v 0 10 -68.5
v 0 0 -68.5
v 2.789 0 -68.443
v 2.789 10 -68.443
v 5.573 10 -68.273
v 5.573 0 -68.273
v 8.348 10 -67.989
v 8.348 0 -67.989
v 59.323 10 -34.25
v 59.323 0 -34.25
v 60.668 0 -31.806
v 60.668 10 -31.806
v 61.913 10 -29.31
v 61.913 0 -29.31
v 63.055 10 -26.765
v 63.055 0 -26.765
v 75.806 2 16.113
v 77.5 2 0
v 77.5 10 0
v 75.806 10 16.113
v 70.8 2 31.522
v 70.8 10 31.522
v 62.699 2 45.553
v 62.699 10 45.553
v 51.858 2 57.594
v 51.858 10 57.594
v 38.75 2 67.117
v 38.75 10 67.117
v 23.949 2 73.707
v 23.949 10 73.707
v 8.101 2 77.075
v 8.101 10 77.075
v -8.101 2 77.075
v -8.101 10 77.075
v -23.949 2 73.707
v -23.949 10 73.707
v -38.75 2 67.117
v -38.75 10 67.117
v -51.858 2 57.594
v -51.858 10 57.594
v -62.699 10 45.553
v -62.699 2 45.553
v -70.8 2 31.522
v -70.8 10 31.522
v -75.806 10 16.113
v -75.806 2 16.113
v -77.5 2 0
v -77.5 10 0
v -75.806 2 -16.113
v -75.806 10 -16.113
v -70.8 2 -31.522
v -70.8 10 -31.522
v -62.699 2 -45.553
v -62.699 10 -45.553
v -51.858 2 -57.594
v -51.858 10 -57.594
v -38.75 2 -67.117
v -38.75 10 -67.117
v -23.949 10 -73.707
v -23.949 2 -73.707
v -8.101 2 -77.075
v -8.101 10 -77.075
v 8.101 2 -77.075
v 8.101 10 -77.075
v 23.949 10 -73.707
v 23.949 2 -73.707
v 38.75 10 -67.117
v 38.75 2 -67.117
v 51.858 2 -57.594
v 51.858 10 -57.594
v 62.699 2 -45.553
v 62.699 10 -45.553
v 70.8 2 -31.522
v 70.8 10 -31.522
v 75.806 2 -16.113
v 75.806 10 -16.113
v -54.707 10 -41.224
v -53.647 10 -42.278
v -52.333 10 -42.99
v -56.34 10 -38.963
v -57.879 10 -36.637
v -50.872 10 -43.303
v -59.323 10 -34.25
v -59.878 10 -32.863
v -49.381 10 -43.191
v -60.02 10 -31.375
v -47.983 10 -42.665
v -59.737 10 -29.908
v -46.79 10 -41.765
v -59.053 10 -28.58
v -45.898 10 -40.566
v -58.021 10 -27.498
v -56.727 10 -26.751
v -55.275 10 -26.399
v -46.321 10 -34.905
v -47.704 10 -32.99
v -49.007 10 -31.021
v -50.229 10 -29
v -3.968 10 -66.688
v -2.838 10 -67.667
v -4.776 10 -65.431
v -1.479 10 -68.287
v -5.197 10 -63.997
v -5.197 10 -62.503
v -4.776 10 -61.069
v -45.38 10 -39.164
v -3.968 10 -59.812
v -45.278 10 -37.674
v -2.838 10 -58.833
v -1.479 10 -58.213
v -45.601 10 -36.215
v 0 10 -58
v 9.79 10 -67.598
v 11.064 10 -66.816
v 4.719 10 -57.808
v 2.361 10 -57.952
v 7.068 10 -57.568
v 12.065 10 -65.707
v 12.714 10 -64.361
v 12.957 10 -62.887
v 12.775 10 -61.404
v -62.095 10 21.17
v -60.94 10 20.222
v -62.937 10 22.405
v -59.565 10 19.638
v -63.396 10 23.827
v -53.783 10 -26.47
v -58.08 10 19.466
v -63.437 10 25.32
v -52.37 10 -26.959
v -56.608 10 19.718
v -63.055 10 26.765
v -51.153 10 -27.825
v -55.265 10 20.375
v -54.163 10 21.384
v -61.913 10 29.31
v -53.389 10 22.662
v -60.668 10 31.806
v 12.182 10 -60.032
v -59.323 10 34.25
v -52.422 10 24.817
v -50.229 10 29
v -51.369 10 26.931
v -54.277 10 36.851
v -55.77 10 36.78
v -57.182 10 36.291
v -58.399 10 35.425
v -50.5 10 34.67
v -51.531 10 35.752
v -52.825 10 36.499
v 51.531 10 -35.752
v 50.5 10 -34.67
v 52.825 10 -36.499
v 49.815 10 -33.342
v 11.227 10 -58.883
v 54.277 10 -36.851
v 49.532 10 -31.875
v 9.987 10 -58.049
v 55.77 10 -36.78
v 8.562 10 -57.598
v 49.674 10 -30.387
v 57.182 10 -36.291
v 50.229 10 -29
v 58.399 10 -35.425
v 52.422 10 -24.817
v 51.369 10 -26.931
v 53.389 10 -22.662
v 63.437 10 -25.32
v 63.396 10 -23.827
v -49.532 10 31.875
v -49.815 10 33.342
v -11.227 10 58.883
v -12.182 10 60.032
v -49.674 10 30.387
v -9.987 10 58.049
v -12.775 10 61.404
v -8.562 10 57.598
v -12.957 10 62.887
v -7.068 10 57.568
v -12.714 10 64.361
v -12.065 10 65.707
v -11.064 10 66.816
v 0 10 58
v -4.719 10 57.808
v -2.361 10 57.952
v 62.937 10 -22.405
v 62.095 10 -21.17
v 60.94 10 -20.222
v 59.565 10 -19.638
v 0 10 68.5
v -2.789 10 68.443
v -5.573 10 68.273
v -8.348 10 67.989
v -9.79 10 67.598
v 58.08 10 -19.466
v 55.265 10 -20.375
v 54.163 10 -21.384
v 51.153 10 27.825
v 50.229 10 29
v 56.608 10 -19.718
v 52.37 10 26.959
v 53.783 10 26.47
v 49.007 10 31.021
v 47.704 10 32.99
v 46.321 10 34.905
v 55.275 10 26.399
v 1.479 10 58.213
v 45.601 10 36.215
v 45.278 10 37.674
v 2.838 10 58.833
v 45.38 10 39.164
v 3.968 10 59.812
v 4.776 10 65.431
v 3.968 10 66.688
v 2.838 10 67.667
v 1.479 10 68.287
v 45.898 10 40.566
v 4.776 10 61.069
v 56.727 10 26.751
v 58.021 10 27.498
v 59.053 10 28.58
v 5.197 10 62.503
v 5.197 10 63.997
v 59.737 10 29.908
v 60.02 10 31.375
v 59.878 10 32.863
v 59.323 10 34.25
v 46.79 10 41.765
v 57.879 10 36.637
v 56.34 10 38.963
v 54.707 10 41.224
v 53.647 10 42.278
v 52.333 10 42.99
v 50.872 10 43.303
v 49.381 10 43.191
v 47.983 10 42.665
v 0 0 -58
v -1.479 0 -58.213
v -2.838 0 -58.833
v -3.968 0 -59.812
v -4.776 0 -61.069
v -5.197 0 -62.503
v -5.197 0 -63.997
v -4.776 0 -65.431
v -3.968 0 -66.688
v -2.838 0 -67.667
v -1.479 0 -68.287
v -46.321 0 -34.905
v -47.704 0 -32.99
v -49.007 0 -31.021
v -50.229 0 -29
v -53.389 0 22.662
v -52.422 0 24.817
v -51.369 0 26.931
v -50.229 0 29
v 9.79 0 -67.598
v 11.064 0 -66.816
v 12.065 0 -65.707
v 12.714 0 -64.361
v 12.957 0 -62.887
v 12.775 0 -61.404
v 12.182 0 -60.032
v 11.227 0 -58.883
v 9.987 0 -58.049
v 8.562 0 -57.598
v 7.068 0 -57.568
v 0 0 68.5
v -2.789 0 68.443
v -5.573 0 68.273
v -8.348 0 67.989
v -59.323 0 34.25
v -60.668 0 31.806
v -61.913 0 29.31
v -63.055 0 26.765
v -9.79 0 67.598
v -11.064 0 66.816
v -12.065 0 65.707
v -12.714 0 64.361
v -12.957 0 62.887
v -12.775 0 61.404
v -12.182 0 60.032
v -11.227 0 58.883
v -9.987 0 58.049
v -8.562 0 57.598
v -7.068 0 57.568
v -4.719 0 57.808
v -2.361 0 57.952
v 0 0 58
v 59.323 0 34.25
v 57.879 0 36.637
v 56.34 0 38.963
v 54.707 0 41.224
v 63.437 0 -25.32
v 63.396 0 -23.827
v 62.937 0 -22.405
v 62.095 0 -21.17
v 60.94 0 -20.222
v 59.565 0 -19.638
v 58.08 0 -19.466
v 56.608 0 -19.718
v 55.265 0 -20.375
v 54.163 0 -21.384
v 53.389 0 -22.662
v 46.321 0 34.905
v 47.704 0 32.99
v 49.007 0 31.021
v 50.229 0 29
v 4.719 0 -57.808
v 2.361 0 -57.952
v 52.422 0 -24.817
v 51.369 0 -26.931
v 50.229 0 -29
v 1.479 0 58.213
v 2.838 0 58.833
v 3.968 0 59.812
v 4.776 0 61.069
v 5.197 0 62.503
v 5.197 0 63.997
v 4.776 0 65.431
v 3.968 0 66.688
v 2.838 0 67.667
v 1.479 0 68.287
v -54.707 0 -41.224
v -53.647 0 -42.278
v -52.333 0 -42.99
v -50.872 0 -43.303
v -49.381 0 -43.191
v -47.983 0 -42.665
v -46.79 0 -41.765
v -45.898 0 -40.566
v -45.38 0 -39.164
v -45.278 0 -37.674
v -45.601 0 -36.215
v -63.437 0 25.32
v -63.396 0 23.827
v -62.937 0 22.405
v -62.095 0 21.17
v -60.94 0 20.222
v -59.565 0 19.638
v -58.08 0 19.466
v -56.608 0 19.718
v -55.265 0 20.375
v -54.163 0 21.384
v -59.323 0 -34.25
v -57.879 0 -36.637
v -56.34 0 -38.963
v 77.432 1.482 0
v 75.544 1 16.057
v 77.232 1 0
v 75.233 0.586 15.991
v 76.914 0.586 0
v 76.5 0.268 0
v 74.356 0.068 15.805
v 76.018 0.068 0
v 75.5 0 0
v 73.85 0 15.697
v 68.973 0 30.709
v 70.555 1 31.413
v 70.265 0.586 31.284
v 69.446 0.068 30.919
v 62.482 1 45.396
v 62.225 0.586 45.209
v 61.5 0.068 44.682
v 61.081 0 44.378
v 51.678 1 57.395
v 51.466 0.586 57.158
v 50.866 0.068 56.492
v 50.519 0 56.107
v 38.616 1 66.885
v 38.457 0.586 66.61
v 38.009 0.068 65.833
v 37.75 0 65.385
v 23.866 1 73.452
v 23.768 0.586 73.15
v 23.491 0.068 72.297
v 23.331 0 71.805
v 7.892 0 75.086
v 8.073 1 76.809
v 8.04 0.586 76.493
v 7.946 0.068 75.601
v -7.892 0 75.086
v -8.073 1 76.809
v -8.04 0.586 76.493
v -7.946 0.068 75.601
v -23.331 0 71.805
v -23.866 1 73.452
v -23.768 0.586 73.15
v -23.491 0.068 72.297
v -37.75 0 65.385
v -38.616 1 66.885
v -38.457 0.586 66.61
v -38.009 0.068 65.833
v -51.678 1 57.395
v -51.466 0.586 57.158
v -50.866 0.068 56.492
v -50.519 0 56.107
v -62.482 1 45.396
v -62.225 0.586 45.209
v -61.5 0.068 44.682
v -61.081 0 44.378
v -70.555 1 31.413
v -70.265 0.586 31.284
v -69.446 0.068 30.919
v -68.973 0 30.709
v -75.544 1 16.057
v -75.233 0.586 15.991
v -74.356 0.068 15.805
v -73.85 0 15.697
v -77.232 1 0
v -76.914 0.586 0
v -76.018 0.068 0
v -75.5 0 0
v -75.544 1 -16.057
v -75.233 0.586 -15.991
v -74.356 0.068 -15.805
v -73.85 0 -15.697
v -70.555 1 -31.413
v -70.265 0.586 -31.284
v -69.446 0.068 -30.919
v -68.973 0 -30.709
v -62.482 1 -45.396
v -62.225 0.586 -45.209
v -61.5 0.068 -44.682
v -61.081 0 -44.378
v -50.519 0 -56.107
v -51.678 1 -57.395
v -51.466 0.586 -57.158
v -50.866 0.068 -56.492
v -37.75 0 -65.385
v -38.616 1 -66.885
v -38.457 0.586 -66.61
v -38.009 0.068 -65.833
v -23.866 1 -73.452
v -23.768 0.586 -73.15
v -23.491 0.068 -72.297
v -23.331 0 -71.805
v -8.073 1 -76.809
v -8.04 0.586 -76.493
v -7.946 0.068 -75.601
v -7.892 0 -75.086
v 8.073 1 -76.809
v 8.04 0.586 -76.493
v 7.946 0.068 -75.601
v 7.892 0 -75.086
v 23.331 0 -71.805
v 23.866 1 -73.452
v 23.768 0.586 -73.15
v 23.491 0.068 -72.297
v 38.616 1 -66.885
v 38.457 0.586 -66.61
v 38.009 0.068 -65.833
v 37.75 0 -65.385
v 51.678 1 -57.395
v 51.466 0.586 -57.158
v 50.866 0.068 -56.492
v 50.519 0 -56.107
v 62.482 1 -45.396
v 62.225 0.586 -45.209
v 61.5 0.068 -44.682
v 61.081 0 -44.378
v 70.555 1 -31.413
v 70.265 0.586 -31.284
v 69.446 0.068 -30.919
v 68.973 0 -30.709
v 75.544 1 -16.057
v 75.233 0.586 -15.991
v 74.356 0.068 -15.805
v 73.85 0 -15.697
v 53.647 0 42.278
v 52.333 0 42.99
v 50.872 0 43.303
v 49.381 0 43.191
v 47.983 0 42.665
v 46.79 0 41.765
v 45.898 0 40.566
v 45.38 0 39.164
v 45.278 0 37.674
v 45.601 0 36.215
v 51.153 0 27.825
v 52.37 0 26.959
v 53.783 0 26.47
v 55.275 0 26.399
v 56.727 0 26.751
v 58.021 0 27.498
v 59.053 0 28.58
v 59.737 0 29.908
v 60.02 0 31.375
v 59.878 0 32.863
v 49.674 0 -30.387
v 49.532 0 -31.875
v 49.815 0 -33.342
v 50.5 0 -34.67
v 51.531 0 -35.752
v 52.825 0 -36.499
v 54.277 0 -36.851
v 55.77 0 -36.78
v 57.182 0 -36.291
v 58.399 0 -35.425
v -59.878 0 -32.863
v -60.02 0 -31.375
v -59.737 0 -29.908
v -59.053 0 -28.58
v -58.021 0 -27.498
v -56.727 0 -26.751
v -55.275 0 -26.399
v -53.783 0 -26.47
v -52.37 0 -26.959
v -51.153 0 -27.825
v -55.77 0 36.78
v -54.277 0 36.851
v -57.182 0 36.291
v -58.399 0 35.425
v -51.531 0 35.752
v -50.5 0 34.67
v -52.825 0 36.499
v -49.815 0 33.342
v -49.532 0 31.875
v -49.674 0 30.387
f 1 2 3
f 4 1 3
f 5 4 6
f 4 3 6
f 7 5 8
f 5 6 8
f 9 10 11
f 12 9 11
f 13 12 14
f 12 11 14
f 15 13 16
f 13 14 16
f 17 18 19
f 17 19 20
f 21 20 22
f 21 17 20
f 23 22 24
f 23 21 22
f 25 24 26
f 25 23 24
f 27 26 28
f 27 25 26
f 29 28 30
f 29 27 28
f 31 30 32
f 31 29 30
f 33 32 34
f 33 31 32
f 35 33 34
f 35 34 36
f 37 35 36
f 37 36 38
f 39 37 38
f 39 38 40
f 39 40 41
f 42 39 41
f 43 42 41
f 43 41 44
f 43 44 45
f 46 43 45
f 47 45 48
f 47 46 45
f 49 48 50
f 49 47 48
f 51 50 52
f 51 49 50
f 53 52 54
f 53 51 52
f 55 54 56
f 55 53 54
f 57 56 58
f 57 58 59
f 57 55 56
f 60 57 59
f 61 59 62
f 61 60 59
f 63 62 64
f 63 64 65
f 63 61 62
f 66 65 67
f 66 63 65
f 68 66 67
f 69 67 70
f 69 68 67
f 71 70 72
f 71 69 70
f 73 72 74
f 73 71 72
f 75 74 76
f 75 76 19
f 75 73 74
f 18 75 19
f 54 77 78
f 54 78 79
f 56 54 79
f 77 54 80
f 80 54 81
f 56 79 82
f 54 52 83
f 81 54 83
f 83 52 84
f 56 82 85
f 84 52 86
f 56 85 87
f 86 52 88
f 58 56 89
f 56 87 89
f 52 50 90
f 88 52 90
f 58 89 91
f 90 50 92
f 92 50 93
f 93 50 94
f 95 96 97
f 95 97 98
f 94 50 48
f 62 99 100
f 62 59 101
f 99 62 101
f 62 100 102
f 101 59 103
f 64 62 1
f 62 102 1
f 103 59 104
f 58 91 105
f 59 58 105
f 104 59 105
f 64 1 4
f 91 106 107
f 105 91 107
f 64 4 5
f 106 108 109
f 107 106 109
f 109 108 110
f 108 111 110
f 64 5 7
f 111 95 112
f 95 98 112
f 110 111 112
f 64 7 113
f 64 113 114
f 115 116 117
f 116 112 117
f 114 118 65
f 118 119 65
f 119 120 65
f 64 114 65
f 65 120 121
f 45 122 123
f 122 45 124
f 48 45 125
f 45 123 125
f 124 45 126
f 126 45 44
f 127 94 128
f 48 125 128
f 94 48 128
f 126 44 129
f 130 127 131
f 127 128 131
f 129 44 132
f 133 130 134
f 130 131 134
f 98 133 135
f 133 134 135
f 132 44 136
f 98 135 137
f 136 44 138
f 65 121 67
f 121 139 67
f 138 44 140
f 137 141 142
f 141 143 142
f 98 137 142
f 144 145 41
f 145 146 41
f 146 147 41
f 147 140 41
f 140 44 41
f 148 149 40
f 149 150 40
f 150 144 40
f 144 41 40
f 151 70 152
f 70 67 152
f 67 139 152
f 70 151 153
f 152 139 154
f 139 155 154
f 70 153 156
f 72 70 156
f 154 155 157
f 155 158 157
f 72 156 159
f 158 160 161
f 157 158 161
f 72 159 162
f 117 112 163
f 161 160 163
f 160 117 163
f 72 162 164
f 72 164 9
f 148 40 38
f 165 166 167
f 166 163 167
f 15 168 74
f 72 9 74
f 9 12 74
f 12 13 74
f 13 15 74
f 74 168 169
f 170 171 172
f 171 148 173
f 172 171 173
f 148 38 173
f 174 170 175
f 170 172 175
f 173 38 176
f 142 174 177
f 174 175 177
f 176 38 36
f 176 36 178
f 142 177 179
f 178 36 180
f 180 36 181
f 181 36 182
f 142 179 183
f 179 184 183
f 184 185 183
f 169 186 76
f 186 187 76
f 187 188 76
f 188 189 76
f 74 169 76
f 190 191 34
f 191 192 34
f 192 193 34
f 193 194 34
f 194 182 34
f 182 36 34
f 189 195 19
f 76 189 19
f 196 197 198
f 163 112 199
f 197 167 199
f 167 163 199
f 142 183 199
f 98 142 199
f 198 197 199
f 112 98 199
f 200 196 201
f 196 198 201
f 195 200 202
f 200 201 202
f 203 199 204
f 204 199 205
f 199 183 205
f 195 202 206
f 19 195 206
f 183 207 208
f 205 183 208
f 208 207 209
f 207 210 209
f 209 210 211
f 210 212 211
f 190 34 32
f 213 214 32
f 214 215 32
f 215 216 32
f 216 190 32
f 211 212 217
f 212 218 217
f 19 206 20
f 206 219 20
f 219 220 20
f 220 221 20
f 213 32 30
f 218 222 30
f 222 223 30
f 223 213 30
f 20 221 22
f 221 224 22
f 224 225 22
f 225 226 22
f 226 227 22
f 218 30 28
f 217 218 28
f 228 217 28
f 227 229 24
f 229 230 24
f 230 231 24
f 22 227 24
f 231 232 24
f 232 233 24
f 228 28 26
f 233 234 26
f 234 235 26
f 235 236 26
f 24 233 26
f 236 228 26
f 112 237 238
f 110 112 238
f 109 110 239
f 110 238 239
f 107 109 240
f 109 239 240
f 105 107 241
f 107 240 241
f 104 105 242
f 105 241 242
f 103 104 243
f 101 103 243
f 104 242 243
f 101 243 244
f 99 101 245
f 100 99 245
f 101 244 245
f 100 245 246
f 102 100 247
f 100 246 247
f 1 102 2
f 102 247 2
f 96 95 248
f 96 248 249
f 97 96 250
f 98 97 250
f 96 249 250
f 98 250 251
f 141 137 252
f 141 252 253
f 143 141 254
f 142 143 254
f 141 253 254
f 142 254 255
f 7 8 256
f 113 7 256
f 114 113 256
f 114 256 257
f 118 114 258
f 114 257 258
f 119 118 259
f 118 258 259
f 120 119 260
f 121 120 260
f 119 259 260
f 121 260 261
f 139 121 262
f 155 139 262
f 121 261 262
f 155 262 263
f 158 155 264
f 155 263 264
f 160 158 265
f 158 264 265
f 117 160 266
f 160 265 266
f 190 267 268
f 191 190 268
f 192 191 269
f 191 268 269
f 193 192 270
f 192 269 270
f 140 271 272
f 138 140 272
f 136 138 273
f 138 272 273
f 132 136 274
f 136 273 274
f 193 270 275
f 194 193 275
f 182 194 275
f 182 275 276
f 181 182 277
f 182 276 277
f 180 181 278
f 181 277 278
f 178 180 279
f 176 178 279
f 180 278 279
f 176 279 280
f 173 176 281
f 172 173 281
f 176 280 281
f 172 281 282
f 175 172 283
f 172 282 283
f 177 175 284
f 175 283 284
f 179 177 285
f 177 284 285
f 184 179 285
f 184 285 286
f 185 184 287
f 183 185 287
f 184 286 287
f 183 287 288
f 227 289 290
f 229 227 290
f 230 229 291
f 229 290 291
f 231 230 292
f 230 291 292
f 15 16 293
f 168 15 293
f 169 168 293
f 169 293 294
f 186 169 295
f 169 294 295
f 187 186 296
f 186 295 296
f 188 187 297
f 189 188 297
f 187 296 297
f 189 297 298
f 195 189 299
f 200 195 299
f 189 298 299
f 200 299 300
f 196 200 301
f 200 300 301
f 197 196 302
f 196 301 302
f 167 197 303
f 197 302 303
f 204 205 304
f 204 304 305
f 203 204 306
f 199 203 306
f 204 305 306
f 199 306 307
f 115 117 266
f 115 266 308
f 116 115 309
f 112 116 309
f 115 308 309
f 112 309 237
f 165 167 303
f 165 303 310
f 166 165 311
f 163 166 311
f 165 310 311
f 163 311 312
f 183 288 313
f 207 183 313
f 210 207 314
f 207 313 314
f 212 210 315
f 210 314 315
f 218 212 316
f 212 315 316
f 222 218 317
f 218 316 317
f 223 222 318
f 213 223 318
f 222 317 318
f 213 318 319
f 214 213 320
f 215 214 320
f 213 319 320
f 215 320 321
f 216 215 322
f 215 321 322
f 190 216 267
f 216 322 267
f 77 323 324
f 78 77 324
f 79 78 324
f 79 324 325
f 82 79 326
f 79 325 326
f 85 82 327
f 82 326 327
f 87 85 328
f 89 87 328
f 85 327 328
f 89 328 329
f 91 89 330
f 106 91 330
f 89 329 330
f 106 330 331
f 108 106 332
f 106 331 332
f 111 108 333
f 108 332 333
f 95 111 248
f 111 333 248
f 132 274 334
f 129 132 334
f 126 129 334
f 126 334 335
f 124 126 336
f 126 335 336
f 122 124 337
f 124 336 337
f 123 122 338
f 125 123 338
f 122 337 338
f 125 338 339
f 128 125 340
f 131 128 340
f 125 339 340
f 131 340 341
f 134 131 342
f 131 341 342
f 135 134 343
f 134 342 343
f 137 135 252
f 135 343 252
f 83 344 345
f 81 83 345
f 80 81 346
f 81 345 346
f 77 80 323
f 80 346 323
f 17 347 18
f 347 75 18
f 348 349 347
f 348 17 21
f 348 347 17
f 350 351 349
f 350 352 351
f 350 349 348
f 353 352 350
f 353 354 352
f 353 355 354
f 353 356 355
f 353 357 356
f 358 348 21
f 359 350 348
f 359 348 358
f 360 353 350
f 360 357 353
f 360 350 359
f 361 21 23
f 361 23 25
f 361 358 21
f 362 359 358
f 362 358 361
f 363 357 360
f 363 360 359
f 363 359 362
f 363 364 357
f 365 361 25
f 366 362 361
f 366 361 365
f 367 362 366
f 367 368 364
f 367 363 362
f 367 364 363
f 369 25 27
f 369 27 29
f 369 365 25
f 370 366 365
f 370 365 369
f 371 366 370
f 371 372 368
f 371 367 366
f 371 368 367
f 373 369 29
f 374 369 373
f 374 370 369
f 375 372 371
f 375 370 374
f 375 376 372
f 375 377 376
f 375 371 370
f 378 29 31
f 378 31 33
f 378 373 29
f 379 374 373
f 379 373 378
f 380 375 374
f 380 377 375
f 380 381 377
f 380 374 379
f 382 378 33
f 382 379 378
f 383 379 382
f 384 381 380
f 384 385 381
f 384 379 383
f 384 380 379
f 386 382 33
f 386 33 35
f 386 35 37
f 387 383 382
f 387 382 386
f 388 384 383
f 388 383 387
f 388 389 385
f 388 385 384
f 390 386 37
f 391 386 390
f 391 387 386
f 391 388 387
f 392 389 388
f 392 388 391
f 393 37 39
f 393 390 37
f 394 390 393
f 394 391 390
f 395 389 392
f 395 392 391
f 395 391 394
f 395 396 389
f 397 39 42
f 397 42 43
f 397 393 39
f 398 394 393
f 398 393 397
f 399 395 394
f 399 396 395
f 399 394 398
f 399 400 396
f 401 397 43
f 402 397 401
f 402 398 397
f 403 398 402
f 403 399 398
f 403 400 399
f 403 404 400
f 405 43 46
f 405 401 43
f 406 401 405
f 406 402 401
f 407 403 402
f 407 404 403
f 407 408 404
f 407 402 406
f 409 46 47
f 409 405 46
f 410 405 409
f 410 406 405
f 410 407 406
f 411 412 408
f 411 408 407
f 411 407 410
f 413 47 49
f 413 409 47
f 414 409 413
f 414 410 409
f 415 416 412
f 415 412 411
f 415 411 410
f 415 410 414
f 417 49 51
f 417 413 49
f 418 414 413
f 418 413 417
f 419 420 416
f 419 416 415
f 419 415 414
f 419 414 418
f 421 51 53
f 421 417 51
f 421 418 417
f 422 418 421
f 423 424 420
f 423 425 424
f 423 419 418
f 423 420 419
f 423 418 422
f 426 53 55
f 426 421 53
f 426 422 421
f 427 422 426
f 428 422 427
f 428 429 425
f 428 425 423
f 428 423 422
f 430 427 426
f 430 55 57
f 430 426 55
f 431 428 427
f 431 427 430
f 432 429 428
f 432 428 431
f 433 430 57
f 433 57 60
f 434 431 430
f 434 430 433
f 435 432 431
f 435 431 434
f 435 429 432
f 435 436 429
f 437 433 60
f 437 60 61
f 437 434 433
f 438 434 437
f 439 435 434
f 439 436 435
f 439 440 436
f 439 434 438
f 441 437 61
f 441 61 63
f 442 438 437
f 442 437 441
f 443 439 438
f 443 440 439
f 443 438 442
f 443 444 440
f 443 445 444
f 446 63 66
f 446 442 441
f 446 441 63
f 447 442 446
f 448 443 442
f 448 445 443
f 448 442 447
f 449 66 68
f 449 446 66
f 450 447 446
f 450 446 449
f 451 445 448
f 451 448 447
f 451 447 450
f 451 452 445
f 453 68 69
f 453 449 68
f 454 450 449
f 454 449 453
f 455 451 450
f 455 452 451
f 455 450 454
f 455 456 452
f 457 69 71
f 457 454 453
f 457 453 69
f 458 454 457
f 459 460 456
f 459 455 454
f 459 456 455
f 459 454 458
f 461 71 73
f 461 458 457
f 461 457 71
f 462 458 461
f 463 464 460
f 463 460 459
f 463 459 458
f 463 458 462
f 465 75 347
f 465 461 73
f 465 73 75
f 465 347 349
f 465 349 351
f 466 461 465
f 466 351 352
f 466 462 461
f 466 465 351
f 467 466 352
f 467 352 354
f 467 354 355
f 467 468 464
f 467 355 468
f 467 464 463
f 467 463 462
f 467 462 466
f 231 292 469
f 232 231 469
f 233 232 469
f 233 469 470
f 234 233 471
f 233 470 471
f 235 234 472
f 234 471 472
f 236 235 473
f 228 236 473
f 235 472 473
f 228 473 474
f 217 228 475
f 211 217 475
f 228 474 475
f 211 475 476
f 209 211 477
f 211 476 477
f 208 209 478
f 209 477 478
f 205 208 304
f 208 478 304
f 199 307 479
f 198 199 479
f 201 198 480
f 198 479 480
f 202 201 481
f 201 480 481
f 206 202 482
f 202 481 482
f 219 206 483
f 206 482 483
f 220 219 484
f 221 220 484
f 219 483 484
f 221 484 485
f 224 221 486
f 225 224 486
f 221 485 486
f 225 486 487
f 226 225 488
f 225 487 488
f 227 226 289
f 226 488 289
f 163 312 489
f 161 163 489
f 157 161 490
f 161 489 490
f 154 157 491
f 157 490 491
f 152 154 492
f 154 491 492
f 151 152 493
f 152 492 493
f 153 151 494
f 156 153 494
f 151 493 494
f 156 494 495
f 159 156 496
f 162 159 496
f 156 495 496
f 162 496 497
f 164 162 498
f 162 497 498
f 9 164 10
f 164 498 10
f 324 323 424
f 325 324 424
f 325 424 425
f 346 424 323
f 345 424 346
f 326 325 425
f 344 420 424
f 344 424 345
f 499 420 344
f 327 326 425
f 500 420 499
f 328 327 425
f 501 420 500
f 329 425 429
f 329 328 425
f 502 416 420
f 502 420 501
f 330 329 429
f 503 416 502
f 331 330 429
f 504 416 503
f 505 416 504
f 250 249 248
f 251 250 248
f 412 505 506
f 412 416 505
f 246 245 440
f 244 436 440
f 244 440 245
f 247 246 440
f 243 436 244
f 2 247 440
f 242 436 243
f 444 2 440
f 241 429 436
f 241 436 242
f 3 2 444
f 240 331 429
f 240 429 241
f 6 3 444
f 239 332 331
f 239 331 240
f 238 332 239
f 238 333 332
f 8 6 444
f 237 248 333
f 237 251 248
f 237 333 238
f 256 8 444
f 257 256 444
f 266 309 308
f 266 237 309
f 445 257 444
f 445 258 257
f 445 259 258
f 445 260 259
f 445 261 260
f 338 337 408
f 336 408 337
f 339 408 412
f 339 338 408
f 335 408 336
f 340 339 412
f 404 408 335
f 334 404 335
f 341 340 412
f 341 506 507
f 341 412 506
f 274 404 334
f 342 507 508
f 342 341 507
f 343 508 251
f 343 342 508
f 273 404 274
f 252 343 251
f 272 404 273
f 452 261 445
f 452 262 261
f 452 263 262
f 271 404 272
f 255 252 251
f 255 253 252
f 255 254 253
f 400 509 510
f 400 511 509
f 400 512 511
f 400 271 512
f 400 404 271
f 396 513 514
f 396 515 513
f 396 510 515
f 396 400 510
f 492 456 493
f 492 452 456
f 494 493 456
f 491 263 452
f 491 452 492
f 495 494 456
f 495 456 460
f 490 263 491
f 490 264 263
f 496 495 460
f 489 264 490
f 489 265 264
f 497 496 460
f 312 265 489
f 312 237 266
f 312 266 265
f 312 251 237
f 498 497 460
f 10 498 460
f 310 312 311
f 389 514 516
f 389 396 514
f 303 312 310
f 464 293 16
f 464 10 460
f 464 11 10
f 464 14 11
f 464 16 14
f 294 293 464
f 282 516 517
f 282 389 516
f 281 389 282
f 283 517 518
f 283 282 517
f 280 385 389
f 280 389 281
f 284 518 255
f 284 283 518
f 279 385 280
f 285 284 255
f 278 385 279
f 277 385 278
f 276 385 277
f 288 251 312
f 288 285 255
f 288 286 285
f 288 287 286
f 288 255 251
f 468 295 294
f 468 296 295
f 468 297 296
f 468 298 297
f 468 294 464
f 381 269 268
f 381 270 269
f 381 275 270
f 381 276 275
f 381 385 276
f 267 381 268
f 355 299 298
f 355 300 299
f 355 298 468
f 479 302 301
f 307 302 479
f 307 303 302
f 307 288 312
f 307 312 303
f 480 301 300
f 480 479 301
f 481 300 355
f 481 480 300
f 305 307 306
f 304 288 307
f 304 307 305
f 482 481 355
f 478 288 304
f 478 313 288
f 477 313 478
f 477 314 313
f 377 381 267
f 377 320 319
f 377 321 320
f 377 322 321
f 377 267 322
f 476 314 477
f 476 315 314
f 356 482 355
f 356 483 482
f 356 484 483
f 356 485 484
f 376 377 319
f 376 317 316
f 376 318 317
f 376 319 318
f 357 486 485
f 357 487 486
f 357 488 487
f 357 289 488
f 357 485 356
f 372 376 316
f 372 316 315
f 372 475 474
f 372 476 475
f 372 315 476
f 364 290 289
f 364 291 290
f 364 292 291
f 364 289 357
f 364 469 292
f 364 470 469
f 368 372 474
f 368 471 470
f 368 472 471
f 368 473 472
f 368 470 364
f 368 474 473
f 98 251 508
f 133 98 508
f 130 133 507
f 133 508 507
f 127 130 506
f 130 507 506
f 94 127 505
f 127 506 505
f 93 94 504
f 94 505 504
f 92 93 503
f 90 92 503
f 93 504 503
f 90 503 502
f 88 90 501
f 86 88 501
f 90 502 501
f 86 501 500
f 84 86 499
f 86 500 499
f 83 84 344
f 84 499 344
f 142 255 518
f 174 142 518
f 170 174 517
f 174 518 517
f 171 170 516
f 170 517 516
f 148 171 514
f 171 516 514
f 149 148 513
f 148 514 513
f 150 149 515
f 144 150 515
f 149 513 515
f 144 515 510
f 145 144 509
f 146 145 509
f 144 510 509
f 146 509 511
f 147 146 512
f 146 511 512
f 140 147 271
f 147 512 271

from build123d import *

# Parameters (mm, degrees)
F1_R            = 77.5
F2_DEPTH        = 10
F3_R            = 2
F4_DEPTH        = 10
F4_COPIES_COUNT = 6


# Not quite as in the source:
# - a pattern or mirror of a feature is missing from the dataset's text; its kind, count and spacing are read off the source's solid


with BuildPart() as f2:
    # F1 (on Front) → F2 (new body)
    with BuildSketch(Plane.XZ):
        Circle(F1_R)
    extrude(amount=-F2_DEPTH)

    # F3
    f3_edges = [f2.edges().sort_by_distance(p)[0] for p in [
        (-77.5, 0, 0),
    ]]
    fillet(f3_edges, radius=F3_R)

    # F0 (on Front) → F4 (cut, through all)
    with BuildSketch(Plane.XZ):
        with BuildLine():
            ThreePointArc((0, 68.5), (-4.1818249581, 68.3722336919), (-8.3480500233, 67.9894113874))
            ThreePointArc((-8.3480500233, 67.9894113874), (-12.9191032665, 62.1387300384), (-7.0684219175, 57.5676767952))
            ThreePointArc((-7.0684219175, 57.5676767952), (-3.540815293, 57.8918183085), (0, 58))
            ThreePointArc((0, 58), (5.25, 63.25), (0, 68.5))
        make_face()
    f4 = extrude(amount=-F4_DEPTH, mode=Mode.SUBTRACT)

    # F4_copies: F4 ×6 about axis
    f4_copies_axis = Axis((0, 0, 0), (0, 1, 0))
    for i in range(1, F4_COPIES_COUNT):
        add(f4.rotate(f4_copies_axis, i * 360 / F4_COPIES_COUNT), mode=Mode.SUBTRACT)


solid = f2.part
